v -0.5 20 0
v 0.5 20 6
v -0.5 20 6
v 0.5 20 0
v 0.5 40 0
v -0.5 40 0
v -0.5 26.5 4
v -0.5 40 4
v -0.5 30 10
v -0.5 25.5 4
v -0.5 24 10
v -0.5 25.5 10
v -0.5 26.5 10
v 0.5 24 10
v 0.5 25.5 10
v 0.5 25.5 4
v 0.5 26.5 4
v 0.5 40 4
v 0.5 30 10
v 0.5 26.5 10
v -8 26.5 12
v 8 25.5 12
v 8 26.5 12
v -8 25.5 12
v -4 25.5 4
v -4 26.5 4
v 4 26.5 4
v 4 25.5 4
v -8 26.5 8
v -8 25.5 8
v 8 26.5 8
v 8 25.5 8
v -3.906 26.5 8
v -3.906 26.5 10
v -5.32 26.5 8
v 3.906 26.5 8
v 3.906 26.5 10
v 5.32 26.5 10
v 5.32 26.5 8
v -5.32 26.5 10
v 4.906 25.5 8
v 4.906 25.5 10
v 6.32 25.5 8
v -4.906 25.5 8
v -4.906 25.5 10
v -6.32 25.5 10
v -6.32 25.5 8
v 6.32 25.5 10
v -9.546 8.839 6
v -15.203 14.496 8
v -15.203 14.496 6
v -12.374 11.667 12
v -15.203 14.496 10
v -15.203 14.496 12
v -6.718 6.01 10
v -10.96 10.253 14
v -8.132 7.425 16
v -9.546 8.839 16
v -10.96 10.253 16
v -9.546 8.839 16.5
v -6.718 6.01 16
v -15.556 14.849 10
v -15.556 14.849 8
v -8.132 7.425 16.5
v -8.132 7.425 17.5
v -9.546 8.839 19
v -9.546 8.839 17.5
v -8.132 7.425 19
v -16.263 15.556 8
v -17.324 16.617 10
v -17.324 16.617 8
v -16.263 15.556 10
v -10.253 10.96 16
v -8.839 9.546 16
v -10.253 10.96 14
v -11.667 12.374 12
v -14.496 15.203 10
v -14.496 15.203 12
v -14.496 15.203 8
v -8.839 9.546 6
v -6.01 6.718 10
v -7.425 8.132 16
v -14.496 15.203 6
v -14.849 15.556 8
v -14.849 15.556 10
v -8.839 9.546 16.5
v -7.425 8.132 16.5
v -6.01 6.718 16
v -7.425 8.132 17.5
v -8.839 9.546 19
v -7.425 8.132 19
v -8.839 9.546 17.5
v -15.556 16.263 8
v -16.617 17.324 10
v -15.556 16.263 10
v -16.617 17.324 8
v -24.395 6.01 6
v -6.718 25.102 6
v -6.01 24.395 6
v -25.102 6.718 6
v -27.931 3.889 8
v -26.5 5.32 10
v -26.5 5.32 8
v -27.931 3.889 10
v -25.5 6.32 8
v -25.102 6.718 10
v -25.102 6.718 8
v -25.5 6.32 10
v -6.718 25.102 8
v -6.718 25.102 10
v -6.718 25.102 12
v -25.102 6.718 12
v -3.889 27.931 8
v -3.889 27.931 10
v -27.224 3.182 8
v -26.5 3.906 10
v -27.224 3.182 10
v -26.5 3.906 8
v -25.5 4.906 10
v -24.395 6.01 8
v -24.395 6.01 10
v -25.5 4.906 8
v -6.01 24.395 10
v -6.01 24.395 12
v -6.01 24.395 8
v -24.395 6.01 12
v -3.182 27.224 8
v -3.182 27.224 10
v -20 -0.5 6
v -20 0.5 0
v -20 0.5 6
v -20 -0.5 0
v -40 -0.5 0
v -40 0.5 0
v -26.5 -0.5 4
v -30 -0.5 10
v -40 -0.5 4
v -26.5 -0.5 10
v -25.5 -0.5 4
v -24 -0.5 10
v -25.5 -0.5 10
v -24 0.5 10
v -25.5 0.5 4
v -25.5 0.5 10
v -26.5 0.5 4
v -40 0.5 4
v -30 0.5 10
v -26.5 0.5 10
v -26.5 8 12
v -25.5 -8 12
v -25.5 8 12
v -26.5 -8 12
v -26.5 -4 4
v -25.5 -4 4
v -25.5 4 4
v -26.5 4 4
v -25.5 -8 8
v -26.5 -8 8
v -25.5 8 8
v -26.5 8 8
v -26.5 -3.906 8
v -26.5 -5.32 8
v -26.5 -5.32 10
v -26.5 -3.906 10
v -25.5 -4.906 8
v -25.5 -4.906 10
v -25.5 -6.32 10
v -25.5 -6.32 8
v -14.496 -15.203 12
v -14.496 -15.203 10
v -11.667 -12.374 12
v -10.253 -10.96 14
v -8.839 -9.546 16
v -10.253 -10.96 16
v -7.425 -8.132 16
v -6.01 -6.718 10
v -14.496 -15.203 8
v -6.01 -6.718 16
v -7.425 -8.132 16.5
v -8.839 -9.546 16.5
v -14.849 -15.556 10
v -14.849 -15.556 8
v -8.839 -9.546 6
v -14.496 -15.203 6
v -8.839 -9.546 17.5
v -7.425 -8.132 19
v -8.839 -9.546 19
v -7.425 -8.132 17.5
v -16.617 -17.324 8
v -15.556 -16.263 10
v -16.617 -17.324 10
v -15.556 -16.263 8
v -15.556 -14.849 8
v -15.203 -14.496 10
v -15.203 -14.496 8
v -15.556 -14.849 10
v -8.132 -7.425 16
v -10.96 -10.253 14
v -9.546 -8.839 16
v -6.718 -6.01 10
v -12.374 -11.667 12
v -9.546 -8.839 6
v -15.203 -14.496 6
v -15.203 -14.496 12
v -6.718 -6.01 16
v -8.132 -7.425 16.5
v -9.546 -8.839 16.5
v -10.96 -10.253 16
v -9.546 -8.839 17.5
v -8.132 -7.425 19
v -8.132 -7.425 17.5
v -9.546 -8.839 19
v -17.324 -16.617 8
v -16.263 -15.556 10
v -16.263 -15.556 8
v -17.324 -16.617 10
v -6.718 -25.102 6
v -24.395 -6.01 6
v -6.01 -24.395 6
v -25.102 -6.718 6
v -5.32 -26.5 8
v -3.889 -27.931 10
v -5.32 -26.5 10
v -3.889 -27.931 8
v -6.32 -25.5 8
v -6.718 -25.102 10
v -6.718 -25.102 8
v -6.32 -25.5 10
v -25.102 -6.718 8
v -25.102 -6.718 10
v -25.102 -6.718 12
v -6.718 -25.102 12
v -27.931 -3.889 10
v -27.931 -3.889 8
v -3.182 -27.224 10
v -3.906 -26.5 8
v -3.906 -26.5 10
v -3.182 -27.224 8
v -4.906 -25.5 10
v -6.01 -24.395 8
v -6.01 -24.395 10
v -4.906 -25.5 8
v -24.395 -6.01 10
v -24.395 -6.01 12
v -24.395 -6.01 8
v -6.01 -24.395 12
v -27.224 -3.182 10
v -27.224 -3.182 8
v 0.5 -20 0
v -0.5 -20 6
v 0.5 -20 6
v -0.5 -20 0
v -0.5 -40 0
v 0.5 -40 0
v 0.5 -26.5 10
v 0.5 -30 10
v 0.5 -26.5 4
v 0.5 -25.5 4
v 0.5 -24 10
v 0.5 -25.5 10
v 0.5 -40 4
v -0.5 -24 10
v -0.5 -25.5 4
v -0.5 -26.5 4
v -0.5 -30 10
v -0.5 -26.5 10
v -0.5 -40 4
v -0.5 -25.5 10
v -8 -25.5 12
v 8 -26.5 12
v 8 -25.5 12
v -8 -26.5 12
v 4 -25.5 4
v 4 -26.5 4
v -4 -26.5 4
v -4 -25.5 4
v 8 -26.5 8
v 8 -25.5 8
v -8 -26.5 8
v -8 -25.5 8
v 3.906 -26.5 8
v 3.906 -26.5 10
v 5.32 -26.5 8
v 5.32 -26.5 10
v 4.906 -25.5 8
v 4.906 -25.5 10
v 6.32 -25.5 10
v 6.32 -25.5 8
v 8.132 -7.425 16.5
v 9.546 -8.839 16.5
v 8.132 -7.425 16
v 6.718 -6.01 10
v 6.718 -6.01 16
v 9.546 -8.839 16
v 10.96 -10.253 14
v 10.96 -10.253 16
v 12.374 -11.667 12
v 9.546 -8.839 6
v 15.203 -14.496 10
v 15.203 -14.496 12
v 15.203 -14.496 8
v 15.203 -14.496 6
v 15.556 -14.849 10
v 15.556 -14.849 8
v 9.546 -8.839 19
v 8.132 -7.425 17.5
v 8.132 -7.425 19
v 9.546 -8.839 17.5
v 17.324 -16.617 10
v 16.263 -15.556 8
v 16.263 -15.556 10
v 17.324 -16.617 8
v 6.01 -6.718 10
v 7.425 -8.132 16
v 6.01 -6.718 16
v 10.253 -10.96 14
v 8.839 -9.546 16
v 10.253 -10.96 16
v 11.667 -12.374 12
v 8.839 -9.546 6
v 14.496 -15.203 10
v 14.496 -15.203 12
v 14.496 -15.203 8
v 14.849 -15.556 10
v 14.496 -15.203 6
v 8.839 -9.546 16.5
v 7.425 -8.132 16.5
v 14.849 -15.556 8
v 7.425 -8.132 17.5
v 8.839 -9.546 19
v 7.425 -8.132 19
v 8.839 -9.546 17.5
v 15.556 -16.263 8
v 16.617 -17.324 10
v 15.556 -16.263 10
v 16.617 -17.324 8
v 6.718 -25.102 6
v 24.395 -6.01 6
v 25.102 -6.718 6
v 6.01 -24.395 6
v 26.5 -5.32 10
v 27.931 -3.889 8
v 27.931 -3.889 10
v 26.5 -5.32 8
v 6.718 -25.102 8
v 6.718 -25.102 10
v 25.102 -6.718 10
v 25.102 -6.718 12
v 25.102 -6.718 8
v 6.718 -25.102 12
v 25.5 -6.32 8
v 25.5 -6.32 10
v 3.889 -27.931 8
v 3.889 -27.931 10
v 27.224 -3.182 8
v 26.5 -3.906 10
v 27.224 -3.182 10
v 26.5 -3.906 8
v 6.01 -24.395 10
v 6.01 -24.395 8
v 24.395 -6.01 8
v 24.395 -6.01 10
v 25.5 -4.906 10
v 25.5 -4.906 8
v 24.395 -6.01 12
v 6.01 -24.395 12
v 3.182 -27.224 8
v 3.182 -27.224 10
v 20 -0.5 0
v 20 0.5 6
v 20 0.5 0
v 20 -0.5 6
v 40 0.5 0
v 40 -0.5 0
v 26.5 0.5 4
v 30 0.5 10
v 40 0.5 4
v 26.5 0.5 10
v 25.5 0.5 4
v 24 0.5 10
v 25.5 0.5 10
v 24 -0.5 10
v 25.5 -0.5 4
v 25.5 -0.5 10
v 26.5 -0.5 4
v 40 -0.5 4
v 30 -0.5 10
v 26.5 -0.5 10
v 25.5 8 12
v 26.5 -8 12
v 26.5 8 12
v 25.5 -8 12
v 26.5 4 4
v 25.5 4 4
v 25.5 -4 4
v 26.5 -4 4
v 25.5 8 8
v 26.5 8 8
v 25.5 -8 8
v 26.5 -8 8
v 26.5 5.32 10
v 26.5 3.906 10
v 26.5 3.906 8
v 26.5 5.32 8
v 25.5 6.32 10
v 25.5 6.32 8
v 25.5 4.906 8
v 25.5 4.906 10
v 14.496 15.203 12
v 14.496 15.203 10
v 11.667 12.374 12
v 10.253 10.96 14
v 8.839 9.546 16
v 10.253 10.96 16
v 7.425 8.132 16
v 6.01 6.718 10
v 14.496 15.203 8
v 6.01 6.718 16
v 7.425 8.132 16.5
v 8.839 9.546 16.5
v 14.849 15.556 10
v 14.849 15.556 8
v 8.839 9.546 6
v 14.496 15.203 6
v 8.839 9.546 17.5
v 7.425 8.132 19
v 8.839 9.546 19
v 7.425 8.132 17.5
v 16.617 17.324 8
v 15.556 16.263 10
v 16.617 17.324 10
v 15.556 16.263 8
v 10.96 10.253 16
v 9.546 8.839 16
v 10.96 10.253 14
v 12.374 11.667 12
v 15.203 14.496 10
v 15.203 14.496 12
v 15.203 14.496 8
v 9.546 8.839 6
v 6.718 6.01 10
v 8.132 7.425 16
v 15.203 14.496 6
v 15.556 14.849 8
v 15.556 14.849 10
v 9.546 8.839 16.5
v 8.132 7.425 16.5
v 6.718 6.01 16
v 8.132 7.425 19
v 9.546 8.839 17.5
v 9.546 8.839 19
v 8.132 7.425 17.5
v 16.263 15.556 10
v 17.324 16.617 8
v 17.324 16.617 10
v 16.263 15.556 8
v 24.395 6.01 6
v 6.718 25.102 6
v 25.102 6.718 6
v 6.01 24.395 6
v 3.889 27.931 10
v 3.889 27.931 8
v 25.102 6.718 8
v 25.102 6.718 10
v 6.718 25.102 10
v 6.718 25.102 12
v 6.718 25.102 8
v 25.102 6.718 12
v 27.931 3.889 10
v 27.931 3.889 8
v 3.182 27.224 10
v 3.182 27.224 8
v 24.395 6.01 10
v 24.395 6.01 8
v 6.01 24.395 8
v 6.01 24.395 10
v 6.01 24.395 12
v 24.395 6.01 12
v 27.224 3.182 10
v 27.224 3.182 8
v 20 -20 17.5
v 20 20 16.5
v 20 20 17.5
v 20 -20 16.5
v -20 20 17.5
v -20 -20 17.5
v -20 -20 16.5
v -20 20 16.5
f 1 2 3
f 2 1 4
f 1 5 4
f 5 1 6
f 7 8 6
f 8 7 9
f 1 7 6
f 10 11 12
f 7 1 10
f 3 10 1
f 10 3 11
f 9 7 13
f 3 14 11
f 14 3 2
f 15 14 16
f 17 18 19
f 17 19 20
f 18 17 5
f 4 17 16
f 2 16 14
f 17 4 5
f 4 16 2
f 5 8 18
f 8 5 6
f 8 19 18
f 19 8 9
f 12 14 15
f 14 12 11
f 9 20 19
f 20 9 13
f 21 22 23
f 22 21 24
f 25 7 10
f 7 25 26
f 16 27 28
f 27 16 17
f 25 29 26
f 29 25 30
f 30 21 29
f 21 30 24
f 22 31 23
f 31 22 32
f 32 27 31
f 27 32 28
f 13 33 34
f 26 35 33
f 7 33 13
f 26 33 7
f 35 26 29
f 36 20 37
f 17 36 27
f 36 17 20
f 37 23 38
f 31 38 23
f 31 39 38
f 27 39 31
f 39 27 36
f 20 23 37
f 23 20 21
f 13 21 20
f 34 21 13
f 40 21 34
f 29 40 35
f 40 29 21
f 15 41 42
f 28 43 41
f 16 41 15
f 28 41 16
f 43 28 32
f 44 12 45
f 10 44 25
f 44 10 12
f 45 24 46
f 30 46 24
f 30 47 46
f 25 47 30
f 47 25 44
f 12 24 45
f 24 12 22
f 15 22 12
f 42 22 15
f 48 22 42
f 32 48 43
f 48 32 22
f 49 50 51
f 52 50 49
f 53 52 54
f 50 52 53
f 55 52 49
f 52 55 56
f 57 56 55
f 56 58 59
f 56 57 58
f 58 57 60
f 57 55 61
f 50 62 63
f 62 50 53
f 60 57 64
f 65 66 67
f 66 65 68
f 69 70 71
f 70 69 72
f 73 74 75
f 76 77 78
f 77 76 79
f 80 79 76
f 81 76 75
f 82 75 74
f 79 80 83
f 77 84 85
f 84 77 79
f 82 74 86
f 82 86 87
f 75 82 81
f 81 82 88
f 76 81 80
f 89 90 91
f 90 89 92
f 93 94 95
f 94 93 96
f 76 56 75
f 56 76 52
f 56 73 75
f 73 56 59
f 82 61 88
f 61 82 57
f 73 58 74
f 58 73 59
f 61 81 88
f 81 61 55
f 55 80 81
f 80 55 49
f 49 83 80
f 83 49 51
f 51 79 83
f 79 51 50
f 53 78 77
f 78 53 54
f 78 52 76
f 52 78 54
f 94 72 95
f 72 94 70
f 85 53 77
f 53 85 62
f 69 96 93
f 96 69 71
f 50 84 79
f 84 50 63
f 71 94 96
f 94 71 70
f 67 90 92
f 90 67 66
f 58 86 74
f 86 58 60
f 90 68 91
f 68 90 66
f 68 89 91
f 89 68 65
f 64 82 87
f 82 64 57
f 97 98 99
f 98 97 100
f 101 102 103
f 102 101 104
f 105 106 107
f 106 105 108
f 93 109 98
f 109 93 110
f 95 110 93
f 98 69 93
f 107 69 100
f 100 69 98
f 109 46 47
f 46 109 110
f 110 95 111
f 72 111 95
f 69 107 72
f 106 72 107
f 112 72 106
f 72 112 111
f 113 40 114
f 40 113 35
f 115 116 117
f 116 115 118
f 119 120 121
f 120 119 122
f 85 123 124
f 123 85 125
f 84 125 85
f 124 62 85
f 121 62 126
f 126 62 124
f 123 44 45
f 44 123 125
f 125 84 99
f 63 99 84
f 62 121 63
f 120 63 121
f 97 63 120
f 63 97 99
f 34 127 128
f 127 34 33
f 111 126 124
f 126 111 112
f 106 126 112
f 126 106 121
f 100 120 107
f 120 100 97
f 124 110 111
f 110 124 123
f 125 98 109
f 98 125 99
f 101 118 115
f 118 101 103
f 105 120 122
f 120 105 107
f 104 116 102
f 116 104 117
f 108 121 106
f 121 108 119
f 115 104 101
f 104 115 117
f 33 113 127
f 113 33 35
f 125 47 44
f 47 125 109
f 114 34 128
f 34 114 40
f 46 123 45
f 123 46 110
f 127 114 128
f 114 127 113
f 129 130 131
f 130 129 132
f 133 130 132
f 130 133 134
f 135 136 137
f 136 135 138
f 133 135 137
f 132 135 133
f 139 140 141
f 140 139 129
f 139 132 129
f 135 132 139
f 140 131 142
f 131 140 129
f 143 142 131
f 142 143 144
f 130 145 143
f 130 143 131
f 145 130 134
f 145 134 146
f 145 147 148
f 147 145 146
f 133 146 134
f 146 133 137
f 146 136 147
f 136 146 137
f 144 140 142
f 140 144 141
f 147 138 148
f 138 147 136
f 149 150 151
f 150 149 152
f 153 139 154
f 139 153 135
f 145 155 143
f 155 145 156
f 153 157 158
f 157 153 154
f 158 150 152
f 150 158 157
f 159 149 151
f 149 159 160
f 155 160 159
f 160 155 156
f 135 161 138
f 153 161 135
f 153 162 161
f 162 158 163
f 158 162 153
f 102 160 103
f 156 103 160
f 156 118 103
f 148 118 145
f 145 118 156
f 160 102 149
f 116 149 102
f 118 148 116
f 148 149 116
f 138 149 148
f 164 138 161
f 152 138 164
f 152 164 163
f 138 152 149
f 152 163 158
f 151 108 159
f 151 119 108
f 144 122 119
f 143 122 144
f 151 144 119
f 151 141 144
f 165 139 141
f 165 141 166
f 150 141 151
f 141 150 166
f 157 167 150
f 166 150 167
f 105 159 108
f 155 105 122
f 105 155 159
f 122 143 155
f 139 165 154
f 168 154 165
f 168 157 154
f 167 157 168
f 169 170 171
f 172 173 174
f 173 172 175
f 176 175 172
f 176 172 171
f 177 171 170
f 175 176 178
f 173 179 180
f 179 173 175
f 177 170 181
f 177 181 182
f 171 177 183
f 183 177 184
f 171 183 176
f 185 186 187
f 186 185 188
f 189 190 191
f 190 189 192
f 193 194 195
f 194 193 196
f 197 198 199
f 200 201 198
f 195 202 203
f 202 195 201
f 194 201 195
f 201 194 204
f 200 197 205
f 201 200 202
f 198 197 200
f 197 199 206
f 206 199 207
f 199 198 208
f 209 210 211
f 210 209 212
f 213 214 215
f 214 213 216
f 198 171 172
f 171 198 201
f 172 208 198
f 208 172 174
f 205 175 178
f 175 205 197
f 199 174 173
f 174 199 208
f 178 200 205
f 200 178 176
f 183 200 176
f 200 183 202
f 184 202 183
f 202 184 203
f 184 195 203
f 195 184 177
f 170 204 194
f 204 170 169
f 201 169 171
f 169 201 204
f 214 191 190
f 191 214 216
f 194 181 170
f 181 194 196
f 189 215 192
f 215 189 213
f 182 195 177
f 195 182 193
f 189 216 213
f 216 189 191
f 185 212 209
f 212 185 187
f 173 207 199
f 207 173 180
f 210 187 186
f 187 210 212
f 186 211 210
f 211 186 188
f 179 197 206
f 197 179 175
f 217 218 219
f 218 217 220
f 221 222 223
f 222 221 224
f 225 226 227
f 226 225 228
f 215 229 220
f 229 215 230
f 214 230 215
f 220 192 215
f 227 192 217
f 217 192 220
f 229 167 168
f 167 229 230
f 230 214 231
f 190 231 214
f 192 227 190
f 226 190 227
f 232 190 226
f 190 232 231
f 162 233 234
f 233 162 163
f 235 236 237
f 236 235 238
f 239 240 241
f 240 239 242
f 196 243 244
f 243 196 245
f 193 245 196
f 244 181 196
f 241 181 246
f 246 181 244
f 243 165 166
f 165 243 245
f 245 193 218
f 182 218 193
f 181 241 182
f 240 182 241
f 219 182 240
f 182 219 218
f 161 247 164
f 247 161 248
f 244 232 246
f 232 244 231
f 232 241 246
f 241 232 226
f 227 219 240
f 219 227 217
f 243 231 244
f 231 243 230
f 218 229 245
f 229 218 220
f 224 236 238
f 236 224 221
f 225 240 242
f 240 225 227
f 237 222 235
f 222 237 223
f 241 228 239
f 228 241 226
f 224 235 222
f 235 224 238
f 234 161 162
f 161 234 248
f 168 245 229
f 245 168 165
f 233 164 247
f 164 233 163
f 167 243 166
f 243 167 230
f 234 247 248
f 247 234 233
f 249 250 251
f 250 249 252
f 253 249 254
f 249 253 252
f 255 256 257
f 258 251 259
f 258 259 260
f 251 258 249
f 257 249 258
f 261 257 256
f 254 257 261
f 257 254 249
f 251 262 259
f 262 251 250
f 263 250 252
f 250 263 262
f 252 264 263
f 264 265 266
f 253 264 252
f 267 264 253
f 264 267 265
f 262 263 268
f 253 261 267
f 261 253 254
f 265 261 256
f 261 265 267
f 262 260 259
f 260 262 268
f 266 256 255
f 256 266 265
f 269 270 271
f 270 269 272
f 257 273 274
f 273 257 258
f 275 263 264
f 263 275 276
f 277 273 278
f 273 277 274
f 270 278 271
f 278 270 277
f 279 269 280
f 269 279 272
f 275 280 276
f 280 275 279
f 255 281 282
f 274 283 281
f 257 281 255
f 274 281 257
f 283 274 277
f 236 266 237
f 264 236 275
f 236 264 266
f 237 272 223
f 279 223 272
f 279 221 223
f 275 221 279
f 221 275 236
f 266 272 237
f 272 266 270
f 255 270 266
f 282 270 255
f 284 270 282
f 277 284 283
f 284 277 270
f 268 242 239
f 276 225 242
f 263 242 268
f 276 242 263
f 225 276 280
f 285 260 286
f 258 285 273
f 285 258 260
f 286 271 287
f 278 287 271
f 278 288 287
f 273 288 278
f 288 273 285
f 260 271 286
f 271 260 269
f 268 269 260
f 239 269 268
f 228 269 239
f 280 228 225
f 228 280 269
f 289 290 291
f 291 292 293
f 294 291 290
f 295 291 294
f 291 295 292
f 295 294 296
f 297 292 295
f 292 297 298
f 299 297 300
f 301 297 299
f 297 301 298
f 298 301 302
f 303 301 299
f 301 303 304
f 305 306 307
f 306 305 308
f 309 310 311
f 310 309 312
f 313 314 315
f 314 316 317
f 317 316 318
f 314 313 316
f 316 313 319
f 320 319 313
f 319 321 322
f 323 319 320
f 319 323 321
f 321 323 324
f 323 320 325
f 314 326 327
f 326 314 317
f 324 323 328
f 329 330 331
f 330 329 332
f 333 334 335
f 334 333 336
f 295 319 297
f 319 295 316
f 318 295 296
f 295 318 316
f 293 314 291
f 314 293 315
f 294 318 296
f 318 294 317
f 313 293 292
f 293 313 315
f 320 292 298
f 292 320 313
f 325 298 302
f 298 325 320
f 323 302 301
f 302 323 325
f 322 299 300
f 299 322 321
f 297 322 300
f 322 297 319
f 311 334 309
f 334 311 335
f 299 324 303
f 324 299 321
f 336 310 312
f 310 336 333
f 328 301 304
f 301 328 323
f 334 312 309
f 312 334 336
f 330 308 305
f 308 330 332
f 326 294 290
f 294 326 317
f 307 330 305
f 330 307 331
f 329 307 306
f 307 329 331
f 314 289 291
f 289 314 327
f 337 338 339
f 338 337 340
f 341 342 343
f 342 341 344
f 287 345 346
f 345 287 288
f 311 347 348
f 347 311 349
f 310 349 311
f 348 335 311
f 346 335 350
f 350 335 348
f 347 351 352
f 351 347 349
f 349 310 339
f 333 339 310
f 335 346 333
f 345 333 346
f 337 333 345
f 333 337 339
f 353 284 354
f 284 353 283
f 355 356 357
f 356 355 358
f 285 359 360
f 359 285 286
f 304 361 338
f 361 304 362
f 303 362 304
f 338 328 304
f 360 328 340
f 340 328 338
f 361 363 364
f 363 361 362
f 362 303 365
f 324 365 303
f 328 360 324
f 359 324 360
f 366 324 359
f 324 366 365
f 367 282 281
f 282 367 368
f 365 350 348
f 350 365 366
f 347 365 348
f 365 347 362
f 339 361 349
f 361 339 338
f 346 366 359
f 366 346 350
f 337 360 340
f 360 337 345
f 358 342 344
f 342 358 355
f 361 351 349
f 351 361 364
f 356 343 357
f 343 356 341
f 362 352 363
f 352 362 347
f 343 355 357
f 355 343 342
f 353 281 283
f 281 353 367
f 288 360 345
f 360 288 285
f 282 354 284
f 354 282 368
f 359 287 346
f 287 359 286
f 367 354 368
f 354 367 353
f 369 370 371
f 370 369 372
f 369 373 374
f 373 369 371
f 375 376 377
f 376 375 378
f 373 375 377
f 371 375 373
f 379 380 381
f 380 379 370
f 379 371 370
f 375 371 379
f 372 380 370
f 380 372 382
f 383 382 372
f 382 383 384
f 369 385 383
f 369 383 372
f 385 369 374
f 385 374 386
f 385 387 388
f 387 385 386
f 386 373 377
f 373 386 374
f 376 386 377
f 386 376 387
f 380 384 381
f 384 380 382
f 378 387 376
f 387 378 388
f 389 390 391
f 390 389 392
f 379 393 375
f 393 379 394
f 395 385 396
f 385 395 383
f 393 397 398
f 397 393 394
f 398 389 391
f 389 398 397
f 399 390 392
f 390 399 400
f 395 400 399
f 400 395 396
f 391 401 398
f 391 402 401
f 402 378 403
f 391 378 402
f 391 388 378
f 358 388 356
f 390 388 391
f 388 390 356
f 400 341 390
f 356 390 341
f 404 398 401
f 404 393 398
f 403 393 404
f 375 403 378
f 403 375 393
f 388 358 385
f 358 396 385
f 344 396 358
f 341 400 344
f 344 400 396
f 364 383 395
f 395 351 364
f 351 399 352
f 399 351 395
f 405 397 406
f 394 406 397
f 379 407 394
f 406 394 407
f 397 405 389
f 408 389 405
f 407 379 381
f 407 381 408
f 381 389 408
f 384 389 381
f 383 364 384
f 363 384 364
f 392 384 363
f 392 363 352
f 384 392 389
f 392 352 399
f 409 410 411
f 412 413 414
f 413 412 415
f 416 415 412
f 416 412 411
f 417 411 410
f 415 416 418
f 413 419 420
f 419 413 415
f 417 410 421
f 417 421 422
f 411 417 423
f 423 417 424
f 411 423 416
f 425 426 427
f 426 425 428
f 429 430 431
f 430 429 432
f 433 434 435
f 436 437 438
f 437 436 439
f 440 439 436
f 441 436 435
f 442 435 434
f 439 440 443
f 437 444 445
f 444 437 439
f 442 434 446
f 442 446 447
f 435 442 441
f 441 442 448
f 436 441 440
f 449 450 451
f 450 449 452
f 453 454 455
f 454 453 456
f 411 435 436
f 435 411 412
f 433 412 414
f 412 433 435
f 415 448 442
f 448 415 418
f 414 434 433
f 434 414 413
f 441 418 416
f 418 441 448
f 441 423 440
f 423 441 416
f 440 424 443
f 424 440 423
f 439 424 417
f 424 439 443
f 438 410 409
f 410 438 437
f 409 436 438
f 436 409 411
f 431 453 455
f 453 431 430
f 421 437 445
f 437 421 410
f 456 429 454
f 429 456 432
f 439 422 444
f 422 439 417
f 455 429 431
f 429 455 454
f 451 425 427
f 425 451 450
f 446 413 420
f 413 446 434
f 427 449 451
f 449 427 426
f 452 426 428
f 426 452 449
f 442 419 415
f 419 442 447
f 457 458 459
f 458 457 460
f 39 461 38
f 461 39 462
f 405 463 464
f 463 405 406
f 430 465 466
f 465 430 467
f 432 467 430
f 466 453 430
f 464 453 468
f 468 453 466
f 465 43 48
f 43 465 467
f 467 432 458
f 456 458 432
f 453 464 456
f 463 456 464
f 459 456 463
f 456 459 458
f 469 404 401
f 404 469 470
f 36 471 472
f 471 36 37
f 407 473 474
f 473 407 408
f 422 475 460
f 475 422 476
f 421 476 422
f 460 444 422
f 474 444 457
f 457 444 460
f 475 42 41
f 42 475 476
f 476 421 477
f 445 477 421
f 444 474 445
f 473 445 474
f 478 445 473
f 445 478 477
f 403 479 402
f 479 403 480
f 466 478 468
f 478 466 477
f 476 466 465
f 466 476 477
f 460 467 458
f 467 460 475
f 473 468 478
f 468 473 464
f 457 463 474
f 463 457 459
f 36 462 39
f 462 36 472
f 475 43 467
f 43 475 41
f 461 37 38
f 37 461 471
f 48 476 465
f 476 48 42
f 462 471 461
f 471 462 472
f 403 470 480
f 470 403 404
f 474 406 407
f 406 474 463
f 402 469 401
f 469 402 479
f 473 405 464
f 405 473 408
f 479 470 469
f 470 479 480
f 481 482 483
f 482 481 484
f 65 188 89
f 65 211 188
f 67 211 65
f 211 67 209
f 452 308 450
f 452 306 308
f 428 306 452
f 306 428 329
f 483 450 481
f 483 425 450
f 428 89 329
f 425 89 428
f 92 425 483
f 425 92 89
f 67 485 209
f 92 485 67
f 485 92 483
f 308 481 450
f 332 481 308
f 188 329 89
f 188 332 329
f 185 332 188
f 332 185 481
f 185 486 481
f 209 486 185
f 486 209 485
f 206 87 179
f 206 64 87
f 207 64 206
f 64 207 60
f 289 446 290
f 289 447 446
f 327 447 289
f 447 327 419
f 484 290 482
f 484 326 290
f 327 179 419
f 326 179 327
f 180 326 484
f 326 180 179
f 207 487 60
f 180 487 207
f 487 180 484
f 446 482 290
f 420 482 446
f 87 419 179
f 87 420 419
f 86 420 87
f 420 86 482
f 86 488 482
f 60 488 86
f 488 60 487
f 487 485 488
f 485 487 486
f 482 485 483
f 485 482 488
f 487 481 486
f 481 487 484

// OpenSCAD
// #####################################
// learn 002
// #####################################

// vars ################################

$fn = 12;

// helpers #############################

module polyk(pts) { linear_extrude(height=1,center=true) polygon(pts); }

// modules #############################

module foot() {
  pts_base = [[0,0],[0,20],[4,20],[10,10],[10,4],[6,0]];
  rotate([0,-90,0]) polyk(pts_base);
  pts_jonction = [[-4,4],[0,8],[4,8],[4,-8],[0,-8],[-4,-4]];
  translate([0,6,8]) rotate([0,-90,90]) polyk(pts_jonction);
}

module foot_link() {
  rotate([0,90,90]) union() {
    cube([6,26,1],center=true);
    translate([0,14,0]) cube([2,6,1],center=true);
    translate([0,-14,0]) cube([2,6,1],center=true);
    pts_1 = [[0,0],[0,8],[4,12],[10,12],[10,6],[8,6],[6,4],[6,0]];
    translate([3,0,-1])
    rotate([90,180,0]) union() {
      polyk(pts_1);
      translate([3,-1,0]) cube([2,4,1],center=true);
      translate([11,9,0]) rotate([0,0,90]) cube([2,4,1],center=true);
    }
  }
}

// assembly ############################

module assembly_002() {
  union() {
    for (i = [0:3]) {
      rotate([0,0,90*i]) translate([0,20,0]) foot();
      rotate([0,0,90*i+45]) translate([0,22,9]) foot_link();
      //
    }
    //
    translate([0,0,17])
    cube([40,40,1],center=true);
    //
  }
}

assembly_002();
//foot_link();
